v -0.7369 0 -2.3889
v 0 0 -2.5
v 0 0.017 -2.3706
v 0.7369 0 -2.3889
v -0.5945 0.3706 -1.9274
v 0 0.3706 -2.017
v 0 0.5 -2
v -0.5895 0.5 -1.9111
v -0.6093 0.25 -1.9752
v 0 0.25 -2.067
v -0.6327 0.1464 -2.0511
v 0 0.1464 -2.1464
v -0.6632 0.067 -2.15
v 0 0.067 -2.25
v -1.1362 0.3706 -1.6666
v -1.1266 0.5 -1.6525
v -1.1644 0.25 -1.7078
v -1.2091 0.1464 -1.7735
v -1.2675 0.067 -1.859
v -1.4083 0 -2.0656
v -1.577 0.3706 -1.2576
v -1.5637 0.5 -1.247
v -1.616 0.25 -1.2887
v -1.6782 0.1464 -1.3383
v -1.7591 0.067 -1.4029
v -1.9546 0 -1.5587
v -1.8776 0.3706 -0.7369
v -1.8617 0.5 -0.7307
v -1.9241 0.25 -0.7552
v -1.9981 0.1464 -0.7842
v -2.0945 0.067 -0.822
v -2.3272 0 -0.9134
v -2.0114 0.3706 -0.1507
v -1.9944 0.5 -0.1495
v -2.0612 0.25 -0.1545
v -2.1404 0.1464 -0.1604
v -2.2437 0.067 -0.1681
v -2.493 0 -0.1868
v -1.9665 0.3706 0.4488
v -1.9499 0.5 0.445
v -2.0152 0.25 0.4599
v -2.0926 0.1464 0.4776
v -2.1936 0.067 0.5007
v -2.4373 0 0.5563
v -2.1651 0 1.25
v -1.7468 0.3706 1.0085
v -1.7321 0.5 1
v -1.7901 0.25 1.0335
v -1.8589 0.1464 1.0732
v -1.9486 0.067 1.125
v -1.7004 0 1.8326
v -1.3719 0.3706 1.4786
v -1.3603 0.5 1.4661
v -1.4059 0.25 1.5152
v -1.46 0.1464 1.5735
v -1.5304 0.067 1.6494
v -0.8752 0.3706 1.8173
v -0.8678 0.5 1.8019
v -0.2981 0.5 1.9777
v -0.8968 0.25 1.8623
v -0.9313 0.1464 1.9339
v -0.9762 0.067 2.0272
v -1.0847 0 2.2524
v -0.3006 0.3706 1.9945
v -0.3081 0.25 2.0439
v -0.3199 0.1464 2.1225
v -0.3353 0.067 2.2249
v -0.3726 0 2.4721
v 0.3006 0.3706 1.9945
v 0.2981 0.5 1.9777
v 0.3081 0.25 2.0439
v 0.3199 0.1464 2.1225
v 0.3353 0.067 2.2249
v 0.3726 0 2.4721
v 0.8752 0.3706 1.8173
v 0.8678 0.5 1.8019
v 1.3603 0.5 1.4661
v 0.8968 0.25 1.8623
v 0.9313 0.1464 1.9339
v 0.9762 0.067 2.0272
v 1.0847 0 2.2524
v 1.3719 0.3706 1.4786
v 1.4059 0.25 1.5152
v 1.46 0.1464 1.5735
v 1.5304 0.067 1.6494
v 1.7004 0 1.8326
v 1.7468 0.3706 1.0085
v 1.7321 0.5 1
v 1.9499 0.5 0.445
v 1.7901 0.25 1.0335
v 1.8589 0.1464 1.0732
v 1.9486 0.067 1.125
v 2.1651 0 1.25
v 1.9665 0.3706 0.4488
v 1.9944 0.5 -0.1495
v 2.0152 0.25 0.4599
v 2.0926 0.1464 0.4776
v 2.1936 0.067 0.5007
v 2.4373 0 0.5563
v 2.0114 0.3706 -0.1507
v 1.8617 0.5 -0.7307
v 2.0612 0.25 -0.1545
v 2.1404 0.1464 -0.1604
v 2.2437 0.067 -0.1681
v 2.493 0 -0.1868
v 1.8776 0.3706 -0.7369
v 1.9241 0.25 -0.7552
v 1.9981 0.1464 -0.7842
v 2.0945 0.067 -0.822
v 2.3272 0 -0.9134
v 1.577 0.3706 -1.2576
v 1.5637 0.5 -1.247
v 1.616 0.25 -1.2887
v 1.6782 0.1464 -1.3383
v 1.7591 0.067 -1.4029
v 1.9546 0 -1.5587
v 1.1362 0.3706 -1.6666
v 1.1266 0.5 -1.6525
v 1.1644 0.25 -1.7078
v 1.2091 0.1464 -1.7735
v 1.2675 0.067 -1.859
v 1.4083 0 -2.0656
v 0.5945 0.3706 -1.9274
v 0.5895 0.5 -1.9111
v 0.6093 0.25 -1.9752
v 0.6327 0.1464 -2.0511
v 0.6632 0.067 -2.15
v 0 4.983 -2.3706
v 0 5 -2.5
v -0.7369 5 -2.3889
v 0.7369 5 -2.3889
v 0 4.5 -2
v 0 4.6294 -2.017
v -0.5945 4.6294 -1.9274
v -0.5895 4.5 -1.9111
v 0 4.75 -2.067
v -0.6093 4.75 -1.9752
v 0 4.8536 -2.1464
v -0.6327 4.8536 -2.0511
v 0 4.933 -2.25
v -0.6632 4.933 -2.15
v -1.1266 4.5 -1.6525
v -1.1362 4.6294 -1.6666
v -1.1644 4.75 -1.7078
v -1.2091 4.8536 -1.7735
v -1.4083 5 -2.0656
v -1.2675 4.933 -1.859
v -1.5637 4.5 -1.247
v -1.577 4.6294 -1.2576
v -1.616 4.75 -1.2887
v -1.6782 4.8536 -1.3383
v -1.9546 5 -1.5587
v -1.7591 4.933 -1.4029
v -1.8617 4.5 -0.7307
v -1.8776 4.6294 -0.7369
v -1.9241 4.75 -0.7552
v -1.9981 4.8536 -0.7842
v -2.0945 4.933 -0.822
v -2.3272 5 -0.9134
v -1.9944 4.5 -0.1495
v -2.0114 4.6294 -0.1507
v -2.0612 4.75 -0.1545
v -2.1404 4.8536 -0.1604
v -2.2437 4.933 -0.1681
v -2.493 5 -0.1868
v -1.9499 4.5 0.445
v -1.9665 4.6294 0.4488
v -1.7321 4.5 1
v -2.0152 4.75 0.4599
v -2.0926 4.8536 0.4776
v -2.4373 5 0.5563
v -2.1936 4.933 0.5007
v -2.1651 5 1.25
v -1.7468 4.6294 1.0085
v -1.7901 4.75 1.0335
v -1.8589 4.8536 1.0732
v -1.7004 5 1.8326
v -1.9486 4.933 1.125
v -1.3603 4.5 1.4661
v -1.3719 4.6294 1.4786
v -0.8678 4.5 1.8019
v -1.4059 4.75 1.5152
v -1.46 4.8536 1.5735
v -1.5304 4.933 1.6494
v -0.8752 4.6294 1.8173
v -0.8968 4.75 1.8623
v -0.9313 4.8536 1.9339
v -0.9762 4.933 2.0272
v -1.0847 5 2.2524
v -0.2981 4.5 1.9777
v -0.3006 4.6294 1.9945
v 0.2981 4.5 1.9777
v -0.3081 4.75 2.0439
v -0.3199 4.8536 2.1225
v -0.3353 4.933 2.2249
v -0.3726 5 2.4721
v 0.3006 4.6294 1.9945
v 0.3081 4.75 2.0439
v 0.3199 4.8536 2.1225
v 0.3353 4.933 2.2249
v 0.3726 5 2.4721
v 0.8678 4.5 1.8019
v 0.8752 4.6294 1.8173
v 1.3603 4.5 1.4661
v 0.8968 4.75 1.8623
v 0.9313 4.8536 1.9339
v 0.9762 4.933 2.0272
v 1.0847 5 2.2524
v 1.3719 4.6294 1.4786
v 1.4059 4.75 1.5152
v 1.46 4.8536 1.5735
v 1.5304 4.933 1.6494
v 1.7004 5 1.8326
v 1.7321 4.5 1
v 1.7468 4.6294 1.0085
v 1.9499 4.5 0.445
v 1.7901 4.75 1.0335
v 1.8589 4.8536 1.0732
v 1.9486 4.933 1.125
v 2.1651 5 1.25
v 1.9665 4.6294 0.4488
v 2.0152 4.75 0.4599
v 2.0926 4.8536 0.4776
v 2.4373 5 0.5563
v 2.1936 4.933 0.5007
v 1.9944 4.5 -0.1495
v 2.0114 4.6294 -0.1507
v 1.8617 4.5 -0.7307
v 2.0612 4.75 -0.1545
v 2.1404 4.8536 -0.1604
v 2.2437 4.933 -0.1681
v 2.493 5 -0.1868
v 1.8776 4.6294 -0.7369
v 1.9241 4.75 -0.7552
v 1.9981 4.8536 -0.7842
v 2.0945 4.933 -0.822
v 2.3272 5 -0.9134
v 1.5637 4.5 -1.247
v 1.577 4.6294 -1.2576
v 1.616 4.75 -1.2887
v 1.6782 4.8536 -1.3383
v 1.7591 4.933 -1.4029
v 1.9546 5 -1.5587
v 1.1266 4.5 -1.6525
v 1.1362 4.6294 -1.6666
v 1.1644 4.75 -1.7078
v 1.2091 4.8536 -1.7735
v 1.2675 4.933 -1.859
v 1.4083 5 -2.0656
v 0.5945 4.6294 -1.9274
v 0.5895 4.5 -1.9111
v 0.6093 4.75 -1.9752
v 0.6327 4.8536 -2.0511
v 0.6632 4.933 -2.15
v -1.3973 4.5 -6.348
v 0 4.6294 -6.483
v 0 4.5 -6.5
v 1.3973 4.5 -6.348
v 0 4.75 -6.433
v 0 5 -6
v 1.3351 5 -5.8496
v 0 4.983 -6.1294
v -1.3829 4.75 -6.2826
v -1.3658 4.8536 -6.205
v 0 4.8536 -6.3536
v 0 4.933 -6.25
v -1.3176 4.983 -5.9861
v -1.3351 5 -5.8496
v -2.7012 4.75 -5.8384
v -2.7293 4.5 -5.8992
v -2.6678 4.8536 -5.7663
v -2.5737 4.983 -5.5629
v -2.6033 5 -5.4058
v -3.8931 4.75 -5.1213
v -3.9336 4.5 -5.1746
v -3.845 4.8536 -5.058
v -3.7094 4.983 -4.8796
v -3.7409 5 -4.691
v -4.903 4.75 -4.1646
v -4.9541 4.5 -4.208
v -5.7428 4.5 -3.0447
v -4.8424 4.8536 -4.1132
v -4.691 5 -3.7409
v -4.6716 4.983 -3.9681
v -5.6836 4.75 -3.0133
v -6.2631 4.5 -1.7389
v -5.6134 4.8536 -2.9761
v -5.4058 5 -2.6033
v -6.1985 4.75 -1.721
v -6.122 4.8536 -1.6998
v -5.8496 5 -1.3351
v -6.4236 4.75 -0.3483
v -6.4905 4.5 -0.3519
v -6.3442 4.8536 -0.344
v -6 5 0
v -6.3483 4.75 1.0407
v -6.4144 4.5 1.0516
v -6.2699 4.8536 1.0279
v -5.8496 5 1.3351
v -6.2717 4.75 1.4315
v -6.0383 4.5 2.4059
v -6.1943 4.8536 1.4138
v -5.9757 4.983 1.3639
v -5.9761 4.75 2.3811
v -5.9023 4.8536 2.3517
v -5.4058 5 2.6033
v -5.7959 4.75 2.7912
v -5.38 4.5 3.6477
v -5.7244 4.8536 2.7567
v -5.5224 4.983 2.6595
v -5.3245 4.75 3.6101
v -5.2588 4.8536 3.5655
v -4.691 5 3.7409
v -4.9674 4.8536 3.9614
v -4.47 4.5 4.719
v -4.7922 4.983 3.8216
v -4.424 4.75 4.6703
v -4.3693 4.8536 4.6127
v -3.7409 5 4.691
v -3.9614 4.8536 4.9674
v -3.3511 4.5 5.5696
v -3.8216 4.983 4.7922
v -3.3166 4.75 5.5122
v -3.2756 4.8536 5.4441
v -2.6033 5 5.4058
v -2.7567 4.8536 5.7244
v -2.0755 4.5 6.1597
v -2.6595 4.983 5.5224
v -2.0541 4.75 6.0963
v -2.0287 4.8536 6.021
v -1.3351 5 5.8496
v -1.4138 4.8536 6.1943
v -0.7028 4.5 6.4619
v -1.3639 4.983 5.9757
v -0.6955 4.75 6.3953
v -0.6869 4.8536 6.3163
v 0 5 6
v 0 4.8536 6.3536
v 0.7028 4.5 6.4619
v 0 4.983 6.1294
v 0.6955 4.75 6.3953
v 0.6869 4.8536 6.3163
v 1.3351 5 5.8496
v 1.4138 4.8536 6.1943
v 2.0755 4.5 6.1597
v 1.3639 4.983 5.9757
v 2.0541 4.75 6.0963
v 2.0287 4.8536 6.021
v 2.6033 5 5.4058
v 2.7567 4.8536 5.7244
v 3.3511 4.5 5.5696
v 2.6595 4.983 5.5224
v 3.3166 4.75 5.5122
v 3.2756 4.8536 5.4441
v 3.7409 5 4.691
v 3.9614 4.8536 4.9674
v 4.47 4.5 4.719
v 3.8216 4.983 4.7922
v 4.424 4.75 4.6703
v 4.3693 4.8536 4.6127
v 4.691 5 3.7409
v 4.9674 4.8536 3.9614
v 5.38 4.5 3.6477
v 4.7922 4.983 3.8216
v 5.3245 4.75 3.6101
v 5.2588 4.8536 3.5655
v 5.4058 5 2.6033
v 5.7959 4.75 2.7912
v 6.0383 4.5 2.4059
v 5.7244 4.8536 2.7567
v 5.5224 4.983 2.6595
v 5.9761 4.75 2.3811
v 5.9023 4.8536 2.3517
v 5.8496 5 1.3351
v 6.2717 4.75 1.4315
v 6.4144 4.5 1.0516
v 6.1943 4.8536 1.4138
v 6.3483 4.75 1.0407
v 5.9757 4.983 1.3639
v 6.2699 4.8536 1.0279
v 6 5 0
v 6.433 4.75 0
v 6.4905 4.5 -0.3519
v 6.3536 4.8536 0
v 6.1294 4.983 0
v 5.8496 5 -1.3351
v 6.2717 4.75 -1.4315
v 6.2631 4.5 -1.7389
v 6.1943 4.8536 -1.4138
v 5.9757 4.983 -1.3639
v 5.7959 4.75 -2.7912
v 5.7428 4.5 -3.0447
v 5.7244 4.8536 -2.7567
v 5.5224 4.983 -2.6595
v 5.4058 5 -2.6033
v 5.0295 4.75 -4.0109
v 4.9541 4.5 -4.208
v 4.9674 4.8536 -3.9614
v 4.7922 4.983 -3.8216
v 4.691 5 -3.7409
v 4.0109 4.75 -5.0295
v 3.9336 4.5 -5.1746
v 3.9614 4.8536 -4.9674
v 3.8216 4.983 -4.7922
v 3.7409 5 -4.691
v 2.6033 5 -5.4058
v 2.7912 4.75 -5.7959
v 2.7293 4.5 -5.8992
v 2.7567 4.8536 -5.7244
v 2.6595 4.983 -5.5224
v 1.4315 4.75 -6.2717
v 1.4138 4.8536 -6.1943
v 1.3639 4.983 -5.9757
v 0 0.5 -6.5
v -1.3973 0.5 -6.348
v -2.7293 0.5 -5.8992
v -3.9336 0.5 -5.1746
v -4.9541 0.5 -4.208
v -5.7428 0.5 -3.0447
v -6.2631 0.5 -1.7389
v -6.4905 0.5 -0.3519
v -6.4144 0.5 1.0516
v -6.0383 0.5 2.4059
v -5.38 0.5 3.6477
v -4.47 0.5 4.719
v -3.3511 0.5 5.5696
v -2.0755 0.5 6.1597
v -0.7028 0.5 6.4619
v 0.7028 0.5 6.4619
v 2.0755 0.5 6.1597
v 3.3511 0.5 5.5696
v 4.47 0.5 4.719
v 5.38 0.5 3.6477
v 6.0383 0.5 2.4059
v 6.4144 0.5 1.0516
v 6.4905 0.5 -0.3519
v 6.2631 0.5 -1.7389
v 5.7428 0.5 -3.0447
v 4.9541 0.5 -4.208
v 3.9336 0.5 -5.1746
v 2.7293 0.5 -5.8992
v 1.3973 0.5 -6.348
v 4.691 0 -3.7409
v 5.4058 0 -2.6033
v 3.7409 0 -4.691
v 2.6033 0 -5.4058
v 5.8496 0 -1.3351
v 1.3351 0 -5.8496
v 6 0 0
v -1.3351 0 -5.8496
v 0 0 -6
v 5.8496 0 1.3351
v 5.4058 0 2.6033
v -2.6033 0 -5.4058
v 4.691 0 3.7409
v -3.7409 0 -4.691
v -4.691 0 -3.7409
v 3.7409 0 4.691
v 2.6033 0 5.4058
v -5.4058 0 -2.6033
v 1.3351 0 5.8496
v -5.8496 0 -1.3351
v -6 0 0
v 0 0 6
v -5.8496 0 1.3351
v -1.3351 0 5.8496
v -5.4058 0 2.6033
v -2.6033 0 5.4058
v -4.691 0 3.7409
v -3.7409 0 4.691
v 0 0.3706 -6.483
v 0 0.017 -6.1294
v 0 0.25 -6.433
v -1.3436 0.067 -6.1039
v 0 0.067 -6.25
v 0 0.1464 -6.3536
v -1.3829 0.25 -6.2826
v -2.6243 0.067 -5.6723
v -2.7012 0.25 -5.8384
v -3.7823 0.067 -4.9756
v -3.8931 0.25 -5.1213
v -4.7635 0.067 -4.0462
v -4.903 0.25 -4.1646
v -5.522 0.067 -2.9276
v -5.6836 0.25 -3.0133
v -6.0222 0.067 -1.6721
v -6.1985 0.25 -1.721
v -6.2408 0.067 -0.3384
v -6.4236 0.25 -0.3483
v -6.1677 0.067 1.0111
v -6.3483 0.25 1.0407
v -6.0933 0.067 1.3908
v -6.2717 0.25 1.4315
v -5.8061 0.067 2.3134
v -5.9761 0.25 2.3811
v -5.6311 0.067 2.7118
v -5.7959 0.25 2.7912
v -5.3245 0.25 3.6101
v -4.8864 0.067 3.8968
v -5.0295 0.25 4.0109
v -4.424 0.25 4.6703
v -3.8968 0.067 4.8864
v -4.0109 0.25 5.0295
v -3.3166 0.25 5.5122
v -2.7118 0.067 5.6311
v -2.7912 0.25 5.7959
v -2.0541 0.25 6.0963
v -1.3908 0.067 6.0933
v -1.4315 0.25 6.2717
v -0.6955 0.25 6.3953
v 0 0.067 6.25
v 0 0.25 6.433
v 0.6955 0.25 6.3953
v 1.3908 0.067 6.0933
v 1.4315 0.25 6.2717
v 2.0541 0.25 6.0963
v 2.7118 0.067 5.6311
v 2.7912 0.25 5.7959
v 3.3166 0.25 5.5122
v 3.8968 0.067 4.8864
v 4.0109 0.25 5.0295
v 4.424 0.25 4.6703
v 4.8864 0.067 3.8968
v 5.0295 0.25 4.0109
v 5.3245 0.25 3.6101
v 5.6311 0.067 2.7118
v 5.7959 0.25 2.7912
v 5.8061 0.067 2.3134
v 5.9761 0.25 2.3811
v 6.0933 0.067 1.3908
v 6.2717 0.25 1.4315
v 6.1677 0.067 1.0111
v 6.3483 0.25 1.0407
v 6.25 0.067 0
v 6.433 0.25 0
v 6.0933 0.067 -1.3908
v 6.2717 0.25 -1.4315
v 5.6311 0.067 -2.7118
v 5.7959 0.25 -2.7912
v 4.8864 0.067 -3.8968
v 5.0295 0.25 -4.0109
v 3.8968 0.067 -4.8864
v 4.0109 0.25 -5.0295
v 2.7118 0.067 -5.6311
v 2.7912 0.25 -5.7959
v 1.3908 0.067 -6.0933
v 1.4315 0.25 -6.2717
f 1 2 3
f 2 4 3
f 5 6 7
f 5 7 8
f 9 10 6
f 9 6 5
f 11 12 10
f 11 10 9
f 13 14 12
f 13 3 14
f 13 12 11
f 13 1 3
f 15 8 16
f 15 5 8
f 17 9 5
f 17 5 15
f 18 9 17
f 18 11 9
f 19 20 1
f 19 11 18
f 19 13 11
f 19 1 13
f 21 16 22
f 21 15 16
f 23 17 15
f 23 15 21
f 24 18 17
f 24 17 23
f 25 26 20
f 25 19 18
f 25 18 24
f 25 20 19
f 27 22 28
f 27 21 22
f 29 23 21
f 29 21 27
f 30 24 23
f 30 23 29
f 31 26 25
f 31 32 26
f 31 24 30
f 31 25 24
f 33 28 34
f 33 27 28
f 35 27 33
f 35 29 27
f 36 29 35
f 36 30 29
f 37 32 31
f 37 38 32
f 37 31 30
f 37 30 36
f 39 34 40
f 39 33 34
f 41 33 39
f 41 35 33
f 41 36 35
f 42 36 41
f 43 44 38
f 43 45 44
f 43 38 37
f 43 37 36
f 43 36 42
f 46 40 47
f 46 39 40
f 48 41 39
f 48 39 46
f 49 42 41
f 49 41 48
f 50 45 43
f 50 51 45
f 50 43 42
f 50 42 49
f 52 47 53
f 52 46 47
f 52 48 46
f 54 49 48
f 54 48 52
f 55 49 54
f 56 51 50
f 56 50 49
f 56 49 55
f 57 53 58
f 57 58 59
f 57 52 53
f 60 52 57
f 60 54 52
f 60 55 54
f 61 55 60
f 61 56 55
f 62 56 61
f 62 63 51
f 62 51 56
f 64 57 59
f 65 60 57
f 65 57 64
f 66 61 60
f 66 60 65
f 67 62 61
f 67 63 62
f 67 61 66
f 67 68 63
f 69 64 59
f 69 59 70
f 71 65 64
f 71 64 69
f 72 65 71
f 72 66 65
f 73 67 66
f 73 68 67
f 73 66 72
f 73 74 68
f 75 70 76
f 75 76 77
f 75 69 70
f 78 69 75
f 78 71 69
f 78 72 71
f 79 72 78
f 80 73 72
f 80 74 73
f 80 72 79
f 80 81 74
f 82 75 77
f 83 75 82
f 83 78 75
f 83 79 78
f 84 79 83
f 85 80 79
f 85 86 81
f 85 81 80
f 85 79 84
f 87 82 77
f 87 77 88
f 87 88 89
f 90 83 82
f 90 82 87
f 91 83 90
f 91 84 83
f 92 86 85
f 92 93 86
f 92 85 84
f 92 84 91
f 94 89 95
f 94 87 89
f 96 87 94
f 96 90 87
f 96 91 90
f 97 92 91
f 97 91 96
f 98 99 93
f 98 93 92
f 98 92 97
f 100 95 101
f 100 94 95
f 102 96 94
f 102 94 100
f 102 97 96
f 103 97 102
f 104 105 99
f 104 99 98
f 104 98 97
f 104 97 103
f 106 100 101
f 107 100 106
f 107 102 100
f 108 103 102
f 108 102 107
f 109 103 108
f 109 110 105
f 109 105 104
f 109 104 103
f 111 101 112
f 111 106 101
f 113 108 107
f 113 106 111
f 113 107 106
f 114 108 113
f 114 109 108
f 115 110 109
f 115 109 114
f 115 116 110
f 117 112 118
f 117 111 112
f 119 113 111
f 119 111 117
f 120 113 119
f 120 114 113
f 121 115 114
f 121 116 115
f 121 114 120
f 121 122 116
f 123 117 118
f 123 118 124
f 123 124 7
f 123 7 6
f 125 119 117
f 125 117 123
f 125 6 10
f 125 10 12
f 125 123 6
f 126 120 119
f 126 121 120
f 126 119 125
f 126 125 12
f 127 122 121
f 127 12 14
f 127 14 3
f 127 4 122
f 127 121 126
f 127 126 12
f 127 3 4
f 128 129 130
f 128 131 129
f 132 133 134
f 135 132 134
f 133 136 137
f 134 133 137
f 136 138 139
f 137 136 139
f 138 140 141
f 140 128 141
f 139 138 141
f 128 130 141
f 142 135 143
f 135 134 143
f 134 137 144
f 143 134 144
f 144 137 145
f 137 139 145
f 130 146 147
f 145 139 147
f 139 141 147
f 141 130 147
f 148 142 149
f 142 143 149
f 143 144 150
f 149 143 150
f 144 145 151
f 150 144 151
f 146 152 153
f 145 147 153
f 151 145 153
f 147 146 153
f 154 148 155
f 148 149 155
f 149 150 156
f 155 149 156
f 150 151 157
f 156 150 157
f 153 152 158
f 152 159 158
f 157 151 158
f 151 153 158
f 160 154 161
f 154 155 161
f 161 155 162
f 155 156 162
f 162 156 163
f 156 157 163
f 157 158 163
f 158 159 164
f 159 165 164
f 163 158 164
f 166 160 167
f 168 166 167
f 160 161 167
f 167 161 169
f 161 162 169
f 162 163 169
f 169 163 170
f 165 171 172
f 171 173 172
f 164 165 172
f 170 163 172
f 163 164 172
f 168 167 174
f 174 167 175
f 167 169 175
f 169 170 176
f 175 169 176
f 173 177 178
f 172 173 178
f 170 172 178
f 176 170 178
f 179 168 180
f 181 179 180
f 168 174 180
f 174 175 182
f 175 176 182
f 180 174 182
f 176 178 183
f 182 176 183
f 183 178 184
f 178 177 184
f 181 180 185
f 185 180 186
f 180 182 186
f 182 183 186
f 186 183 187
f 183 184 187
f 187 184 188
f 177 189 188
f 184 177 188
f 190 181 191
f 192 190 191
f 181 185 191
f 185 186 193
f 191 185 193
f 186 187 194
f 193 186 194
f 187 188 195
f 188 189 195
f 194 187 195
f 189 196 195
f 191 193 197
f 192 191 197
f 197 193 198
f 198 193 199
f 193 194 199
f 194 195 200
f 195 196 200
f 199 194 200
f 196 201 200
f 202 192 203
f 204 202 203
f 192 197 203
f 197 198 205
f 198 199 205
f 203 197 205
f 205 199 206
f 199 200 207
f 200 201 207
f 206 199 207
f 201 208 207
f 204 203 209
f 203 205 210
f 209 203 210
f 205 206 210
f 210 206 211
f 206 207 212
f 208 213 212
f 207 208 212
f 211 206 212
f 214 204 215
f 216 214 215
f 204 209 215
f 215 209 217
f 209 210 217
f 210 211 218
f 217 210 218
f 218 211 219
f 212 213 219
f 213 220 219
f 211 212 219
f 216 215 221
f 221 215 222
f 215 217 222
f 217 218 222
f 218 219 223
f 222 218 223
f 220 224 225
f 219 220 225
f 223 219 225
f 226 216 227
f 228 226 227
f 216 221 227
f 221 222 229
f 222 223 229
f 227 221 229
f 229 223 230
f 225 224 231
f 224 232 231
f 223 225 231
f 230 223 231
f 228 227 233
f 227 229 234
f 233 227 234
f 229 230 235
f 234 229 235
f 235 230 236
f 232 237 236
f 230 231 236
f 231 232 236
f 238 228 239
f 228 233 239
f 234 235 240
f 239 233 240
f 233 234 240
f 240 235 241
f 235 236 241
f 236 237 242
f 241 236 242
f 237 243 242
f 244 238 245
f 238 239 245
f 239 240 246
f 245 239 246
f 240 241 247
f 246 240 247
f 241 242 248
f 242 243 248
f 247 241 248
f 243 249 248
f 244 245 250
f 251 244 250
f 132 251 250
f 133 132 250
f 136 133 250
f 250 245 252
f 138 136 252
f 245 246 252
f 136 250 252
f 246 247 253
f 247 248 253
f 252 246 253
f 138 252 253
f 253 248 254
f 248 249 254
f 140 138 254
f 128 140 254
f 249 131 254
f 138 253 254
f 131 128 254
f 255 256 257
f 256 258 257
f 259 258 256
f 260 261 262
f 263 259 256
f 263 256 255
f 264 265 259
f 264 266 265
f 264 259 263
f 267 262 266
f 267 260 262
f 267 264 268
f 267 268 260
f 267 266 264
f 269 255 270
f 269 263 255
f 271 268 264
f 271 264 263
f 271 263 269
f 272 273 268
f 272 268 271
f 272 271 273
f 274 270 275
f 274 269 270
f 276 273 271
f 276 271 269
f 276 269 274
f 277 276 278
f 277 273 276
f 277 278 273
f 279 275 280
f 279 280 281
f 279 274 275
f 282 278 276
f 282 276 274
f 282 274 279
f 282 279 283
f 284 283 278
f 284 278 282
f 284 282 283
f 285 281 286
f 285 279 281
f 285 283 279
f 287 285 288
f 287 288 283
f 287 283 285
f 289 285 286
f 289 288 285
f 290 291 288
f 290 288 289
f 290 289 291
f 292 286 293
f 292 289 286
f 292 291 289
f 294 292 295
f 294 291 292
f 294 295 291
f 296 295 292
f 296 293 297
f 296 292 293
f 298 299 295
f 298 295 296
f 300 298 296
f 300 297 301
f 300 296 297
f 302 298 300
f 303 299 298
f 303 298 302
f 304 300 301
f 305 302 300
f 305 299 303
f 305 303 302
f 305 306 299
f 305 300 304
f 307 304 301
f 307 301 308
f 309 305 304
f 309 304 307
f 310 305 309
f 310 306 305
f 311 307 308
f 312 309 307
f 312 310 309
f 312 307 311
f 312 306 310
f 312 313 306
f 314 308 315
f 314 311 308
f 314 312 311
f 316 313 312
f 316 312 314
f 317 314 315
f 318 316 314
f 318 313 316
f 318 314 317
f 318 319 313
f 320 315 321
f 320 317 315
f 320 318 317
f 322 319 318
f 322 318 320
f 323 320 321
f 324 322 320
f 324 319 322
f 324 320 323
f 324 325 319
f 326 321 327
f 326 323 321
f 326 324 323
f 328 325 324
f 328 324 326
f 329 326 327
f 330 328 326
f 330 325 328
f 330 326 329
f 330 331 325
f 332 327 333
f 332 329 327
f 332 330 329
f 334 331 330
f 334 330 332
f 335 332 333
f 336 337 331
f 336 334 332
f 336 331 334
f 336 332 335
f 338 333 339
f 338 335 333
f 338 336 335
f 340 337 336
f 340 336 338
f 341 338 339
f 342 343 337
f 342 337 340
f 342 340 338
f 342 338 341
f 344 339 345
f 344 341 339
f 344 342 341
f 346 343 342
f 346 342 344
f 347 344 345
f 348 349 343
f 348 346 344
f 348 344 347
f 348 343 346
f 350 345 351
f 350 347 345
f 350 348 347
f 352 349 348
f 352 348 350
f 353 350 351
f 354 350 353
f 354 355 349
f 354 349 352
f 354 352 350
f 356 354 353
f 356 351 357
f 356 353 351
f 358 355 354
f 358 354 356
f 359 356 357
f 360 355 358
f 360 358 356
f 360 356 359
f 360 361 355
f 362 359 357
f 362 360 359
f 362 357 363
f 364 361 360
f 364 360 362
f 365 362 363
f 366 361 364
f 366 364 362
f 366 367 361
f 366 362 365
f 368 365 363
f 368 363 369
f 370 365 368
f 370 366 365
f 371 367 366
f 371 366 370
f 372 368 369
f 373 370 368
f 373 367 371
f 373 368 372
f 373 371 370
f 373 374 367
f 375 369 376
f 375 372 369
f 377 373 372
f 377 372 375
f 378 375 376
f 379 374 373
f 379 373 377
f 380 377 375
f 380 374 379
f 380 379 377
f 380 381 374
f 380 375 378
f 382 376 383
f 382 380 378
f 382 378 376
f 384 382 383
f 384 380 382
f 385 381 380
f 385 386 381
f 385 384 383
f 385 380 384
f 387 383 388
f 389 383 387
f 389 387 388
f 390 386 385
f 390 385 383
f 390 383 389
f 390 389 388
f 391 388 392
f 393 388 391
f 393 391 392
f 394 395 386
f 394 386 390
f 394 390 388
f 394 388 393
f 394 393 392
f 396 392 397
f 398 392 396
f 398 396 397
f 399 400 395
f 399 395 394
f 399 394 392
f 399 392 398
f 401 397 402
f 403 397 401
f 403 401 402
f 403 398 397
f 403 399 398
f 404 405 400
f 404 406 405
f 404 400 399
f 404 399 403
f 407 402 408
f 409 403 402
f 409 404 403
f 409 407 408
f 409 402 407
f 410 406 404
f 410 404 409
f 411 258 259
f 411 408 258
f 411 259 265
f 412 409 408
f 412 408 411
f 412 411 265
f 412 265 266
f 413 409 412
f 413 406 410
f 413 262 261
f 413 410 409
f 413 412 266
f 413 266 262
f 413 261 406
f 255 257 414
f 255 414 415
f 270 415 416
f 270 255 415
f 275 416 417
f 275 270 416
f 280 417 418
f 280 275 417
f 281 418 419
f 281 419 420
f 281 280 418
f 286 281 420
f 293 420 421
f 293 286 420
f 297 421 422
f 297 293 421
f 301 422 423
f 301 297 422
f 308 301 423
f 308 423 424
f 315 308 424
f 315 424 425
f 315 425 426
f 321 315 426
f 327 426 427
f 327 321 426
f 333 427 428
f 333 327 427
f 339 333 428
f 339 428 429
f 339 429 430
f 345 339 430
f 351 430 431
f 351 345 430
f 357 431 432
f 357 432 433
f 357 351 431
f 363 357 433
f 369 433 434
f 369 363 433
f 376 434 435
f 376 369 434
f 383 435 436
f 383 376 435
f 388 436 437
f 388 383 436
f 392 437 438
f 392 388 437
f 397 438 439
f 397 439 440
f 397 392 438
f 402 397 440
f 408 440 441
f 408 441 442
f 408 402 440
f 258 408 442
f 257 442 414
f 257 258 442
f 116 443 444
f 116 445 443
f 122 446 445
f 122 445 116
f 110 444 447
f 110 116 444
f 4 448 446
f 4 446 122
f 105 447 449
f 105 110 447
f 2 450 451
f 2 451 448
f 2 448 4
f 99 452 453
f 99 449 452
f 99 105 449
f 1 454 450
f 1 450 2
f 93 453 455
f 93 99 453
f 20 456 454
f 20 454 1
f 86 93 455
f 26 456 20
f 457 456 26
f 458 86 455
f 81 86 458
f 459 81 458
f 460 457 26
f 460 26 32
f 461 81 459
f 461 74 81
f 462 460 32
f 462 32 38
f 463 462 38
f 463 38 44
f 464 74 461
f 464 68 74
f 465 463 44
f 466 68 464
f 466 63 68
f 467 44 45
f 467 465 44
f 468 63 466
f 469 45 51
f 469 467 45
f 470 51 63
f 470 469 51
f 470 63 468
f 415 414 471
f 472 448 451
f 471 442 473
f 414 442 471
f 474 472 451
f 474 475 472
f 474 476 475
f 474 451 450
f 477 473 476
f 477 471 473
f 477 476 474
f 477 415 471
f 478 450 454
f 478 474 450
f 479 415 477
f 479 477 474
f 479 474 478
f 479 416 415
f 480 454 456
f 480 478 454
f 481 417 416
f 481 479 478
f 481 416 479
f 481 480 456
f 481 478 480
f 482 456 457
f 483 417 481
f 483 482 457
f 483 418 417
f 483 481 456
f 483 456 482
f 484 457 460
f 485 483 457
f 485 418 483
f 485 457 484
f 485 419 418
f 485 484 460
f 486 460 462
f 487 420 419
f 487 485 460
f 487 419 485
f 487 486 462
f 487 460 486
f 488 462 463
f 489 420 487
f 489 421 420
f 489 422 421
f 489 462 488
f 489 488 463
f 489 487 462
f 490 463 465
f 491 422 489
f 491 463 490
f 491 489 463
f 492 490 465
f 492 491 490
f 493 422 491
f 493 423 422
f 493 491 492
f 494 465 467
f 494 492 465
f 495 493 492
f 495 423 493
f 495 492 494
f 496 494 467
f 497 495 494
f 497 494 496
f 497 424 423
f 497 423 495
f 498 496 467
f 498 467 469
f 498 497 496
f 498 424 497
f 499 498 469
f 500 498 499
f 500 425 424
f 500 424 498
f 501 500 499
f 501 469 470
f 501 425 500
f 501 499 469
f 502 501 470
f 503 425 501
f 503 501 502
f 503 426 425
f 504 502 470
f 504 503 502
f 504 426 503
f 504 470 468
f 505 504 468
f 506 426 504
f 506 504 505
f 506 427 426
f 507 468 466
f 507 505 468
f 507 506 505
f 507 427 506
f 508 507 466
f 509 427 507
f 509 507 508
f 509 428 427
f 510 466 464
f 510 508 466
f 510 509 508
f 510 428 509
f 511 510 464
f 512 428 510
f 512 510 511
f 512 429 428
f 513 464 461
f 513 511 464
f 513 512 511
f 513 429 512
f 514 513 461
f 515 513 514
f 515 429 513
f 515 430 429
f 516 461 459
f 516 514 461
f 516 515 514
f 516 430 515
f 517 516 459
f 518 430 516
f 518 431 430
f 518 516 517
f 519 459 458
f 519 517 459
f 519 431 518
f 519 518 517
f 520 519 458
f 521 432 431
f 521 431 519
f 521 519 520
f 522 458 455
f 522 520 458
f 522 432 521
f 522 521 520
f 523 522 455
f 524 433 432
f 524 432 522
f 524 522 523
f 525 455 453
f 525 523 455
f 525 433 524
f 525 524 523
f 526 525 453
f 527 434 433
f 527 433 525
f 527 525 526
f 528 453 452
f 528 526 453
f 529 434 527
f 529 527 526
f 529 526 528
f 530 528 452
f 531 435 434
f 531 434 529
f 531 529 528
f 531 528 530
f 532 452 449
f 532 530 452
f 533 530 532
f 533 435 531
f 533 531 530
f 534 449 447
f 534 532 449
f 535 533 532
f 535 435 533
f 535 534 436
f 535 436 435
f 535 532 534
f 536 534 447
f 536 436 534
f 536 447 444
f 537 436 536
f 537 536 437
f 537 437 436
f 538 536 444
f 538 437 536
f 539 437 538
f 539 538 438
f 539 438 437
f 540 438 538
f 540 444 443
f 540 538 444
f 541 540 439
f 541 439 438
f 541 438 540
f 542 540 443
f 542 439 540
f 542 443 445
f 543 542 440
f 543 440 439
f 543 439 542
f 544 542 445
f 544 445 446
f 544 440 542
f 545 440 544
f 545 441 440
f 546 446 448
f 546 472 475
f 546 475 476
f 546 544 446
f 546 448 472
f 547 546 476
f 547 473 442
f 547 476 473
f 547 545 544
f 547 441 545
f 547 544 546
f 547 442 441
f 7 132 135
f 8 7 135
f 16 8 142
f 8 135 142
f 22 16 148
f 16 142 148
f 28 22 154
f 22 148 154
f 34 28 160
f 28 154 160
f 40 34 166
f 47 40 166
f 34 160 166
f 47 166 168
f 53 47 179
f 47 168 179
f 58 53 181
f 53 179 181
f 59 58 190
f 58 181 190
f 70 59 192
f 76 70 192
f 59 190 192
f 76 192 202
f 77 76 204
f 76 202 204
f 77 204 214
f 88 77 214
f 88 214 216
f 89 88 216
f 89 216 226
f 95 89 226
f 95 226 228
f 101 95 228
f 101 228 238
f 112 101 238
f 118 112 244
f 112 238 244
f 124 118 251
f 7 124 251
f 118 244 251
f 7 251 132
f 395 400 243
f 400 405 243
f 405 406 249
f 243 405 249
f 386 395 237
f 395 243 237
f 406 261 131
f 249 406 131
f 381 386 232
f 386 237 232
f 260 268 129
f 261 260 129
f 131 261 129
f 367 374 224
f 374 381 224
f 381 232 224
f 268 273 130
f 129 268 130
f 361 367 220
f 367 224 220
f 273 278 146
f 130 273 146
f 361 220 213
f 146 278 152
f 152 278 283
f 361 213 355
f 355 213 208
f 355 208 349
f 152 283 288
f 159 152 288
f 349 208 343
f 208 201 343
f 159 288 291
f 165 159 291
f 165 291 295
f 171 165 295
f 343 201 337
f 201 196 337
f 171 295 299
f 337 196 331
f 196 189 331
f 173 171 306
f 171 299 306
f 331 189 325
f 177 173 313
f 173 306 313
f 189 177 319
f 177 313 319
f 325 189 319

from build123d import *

# Parameters (mm, degrees)
ESQUISSE1_W = 4.5
ESQUISSE1_H = 5
CONG_1_R    = 0.5


with BuildPart() as part:
    # Esquisse1 → Révolution1 (revolve)
    with BuildSketch(Plane.XY, mode=Mode.PRIVATE) as r_volution1_sk:
        with Locations((4.25, 2.5)):
            Rectangle(ESQUISSE1_W, ESQUISSE1_H)
    revolve(r_volution1_sk.sketch.rotate(Axis((0, 0, 0), (0, 1, 0)), 90), axis=Axis((0, 0, 0), (0, 1, 0)))

    # Congé1
    cong_1_edges = [part.edges().sort_by_distance(p)[0] for p in [
        (0, 0, 2),
        (0, 0, 6.5),
        (0, 5, 6.5),
        (0, 5, 2),
    ]]
    fillet(cong_1_edges, radius=CONG_1_R)


solid = part.part
